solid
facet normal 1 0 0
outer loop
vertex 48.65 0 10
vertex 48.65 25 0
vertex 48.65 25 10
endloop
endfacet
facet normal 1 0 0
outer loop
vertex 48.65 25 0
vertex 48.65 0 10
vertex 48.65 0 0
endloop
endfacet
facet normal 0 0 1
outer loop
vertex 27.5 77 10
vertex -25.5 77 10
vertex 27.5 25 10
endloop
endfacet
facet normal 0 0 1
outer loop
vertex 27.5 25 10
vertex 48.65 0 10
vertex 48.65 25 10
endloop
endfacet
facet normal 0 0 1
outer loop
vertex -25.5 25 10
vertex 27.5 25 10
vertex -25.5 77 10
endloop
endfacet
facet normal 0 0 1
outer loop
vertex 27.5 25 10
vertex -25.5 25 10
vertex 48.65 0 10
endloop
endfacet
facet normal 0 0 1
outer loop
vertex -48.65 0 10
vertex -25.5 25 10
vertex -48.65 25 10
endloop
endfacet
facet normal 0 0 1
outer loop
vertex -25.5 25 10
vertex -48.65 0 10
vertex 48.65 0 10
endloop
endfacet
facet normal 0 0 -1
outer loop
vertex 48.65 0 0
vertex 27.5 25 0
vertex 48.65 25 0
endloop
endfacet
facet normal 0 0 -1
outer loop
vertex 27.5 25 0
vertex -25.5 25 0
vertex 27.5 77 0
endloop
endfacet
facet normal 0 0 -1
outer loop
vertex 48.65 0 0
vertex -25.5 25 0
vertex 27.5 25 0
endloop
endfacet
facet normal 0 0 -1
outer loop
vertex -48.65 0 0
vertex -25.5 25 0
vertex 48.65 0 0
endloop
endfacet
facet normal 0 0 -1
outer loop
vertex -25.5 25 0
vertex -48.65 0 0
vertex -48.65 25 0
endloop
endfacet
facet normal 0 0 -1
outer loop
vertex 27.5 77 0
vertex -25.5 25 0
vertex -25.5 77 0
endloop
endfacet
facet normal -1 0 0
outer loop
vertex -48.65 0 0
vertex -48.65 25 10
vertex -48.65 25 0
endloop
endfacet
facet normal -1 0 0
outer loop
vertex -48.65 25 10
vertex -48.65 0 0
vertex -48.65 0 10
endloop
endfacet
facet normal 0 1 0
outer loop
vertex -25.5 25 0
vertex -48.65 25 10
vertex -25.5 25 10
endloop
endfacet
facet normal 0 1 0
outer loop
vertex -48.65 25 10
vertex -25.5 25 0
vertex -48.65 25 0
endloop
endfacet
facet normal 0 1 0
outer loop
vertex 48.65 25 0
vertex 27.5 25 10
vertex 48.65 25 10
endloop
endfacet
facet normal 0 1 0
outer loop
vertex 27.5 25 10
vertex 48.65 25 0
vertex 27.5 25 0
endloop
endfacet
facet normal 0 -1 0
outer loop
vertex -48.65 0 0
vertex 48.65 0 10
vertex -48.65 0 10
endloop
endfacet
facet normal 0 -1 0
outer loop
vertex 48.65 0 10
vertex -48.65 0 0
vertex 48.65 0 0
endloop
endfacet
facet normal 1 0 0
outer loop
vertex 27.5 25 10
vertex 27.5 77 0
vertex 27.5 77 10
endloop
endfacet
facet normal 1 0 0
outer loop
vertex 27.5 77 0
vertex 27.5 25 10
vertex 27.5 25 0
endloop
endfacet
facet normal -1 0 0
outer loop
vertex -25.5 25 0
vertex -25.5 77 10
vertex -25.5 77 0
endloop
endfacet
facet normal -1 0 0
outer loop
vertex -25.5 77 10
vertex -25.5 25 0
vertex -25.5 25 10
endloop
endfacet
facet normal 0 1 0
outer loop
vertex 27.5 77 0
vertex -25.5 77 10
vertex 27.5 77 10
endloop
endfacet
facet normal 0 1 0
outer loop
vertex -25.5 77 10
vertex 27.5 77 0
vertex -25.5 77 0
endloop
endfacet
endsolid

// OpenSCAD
pared = 2;

diffW = 51;
diffH = 51;
diffD = 1;

cajaW = 97.3;
cajaH = 25;
cajaD = 10;

// Raspbase
translate([-cajaW/2,0,0])
cube([cajaW,cajaH,cajaD]);

//Cámara atrás
translate([-diffW/2,cajaH-1,0])
cube([diffW+pared,diffH+pared,cajaD]);
